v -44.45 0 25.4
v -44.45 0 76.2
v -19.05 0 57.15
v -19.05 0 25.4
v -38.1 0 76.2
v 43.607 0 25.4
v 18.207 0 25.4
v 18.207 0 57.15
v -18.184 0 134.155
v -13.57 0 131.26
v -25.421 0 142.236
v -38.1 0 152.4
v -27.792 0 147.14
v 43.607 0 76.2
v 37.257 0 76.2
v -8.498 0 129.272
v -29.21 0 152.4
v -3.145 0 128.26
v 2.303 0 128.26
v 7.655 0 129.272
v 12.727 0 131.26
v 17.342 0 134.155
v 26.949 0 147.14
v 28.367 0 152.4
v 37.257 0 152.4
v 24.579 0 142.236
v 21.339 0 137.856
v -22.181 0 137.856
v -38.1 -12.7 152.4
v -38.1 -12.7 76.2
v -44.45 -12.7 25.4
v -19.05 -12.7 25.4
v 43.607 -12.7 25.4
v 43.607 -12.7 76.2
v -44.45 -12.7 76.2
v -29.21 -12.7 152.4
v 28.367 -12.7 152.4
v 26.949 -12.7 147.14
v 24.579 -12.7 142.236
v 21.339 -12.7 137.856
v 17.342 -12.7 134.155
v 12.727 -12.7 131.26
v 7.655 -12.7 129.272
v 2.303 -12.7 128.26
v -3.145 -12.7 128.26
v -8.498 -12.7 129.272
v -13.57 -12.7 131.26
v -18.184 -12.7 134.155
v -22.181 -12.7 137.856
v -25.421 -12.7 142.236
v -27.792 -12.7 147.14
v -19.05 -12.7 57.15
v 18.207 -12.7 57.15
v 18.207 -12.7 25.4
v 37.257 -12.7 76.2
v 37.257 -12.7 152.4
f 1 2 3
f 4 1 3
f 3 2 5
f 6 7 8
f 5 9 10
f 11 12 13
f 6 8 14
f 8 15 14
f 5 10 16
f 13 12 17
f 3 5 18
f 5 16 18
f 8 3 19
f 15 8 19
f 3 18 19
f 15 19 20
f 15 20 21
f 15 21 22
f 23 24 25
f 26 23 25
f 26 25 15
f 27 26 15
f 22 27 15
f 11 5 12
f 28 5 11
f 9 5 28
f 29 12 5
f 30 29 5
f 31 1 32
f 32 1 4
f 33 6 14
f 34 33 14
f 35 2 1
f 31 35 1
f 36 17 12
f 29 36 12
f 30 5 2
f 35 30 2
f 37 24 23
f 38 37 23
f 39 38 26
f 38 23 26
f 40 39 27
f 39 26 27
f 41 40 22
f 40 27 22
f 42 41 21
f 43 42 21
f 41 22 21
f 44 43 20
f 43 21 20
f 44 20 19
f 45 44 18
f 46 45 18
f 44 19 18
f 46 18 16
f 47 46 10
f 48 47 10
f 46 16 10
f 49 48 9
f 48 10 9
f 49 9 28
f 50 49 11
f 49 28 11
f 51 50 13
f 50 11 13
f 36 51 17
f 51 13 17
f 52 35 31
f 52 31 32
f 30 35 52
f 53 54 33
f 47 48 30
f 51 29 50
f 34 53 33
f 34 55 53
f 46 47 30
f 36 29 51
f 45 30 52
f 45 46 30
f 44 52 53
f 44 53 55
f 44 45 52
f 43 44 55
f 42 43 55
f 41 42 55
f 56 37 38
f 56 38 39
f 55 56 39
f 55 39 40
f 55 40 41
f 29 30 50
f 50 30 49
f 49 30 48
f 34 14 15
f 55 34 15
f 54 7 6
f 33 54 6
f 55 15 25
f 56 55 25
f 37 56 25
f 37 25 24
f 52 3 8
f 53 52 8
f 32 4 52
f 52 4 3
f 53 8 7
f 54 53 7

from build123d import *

# Parameters (mm, degrees)
F1_DEPTH = 12.7


with BuildPart() as f1:
    # F0 (on Front) → F1 (new body)
    with BuildSketch(Plane.XZ):
        with BuildLine():
            Line((-44.45, 76.2), (-44.45, 25.4))
            Line((-44.45, 25.4), (-19.05, 25.4))
            Line((-19.05, 25.4), (-19.05, 57.15))
            Line((-19.05, 57.15), (18.207463, 57.15))
            Line((18.207463, 57.15), (18.207463, 25.4))
            Line((18.207463, 25.4), (43.607463, 25.4))
            Line((43.607463, 25.4), (43.607463, 76.2))
            Line((43.607463, 76.2), (37.257463, 76.2))
            Line((37.257463, 76.2), (37.257463, 152.4))
            Line((37.257463, 152.4), (28.367463, 152.4))
            ThreePointArc((28.367463, 152.4), (-0.421268, 128.132977), (-29.21, 152.4))
            Line((-29.21, 152.4), (-38.1, 152.4))
            Line((-38.1, 152.4), (-38.1, 76.2))
            Line((-38.1, 76.2), (-44.45, 76.2))
        make_face()
    extrude(amount=F1_DEPTH)


solid = f1.part
